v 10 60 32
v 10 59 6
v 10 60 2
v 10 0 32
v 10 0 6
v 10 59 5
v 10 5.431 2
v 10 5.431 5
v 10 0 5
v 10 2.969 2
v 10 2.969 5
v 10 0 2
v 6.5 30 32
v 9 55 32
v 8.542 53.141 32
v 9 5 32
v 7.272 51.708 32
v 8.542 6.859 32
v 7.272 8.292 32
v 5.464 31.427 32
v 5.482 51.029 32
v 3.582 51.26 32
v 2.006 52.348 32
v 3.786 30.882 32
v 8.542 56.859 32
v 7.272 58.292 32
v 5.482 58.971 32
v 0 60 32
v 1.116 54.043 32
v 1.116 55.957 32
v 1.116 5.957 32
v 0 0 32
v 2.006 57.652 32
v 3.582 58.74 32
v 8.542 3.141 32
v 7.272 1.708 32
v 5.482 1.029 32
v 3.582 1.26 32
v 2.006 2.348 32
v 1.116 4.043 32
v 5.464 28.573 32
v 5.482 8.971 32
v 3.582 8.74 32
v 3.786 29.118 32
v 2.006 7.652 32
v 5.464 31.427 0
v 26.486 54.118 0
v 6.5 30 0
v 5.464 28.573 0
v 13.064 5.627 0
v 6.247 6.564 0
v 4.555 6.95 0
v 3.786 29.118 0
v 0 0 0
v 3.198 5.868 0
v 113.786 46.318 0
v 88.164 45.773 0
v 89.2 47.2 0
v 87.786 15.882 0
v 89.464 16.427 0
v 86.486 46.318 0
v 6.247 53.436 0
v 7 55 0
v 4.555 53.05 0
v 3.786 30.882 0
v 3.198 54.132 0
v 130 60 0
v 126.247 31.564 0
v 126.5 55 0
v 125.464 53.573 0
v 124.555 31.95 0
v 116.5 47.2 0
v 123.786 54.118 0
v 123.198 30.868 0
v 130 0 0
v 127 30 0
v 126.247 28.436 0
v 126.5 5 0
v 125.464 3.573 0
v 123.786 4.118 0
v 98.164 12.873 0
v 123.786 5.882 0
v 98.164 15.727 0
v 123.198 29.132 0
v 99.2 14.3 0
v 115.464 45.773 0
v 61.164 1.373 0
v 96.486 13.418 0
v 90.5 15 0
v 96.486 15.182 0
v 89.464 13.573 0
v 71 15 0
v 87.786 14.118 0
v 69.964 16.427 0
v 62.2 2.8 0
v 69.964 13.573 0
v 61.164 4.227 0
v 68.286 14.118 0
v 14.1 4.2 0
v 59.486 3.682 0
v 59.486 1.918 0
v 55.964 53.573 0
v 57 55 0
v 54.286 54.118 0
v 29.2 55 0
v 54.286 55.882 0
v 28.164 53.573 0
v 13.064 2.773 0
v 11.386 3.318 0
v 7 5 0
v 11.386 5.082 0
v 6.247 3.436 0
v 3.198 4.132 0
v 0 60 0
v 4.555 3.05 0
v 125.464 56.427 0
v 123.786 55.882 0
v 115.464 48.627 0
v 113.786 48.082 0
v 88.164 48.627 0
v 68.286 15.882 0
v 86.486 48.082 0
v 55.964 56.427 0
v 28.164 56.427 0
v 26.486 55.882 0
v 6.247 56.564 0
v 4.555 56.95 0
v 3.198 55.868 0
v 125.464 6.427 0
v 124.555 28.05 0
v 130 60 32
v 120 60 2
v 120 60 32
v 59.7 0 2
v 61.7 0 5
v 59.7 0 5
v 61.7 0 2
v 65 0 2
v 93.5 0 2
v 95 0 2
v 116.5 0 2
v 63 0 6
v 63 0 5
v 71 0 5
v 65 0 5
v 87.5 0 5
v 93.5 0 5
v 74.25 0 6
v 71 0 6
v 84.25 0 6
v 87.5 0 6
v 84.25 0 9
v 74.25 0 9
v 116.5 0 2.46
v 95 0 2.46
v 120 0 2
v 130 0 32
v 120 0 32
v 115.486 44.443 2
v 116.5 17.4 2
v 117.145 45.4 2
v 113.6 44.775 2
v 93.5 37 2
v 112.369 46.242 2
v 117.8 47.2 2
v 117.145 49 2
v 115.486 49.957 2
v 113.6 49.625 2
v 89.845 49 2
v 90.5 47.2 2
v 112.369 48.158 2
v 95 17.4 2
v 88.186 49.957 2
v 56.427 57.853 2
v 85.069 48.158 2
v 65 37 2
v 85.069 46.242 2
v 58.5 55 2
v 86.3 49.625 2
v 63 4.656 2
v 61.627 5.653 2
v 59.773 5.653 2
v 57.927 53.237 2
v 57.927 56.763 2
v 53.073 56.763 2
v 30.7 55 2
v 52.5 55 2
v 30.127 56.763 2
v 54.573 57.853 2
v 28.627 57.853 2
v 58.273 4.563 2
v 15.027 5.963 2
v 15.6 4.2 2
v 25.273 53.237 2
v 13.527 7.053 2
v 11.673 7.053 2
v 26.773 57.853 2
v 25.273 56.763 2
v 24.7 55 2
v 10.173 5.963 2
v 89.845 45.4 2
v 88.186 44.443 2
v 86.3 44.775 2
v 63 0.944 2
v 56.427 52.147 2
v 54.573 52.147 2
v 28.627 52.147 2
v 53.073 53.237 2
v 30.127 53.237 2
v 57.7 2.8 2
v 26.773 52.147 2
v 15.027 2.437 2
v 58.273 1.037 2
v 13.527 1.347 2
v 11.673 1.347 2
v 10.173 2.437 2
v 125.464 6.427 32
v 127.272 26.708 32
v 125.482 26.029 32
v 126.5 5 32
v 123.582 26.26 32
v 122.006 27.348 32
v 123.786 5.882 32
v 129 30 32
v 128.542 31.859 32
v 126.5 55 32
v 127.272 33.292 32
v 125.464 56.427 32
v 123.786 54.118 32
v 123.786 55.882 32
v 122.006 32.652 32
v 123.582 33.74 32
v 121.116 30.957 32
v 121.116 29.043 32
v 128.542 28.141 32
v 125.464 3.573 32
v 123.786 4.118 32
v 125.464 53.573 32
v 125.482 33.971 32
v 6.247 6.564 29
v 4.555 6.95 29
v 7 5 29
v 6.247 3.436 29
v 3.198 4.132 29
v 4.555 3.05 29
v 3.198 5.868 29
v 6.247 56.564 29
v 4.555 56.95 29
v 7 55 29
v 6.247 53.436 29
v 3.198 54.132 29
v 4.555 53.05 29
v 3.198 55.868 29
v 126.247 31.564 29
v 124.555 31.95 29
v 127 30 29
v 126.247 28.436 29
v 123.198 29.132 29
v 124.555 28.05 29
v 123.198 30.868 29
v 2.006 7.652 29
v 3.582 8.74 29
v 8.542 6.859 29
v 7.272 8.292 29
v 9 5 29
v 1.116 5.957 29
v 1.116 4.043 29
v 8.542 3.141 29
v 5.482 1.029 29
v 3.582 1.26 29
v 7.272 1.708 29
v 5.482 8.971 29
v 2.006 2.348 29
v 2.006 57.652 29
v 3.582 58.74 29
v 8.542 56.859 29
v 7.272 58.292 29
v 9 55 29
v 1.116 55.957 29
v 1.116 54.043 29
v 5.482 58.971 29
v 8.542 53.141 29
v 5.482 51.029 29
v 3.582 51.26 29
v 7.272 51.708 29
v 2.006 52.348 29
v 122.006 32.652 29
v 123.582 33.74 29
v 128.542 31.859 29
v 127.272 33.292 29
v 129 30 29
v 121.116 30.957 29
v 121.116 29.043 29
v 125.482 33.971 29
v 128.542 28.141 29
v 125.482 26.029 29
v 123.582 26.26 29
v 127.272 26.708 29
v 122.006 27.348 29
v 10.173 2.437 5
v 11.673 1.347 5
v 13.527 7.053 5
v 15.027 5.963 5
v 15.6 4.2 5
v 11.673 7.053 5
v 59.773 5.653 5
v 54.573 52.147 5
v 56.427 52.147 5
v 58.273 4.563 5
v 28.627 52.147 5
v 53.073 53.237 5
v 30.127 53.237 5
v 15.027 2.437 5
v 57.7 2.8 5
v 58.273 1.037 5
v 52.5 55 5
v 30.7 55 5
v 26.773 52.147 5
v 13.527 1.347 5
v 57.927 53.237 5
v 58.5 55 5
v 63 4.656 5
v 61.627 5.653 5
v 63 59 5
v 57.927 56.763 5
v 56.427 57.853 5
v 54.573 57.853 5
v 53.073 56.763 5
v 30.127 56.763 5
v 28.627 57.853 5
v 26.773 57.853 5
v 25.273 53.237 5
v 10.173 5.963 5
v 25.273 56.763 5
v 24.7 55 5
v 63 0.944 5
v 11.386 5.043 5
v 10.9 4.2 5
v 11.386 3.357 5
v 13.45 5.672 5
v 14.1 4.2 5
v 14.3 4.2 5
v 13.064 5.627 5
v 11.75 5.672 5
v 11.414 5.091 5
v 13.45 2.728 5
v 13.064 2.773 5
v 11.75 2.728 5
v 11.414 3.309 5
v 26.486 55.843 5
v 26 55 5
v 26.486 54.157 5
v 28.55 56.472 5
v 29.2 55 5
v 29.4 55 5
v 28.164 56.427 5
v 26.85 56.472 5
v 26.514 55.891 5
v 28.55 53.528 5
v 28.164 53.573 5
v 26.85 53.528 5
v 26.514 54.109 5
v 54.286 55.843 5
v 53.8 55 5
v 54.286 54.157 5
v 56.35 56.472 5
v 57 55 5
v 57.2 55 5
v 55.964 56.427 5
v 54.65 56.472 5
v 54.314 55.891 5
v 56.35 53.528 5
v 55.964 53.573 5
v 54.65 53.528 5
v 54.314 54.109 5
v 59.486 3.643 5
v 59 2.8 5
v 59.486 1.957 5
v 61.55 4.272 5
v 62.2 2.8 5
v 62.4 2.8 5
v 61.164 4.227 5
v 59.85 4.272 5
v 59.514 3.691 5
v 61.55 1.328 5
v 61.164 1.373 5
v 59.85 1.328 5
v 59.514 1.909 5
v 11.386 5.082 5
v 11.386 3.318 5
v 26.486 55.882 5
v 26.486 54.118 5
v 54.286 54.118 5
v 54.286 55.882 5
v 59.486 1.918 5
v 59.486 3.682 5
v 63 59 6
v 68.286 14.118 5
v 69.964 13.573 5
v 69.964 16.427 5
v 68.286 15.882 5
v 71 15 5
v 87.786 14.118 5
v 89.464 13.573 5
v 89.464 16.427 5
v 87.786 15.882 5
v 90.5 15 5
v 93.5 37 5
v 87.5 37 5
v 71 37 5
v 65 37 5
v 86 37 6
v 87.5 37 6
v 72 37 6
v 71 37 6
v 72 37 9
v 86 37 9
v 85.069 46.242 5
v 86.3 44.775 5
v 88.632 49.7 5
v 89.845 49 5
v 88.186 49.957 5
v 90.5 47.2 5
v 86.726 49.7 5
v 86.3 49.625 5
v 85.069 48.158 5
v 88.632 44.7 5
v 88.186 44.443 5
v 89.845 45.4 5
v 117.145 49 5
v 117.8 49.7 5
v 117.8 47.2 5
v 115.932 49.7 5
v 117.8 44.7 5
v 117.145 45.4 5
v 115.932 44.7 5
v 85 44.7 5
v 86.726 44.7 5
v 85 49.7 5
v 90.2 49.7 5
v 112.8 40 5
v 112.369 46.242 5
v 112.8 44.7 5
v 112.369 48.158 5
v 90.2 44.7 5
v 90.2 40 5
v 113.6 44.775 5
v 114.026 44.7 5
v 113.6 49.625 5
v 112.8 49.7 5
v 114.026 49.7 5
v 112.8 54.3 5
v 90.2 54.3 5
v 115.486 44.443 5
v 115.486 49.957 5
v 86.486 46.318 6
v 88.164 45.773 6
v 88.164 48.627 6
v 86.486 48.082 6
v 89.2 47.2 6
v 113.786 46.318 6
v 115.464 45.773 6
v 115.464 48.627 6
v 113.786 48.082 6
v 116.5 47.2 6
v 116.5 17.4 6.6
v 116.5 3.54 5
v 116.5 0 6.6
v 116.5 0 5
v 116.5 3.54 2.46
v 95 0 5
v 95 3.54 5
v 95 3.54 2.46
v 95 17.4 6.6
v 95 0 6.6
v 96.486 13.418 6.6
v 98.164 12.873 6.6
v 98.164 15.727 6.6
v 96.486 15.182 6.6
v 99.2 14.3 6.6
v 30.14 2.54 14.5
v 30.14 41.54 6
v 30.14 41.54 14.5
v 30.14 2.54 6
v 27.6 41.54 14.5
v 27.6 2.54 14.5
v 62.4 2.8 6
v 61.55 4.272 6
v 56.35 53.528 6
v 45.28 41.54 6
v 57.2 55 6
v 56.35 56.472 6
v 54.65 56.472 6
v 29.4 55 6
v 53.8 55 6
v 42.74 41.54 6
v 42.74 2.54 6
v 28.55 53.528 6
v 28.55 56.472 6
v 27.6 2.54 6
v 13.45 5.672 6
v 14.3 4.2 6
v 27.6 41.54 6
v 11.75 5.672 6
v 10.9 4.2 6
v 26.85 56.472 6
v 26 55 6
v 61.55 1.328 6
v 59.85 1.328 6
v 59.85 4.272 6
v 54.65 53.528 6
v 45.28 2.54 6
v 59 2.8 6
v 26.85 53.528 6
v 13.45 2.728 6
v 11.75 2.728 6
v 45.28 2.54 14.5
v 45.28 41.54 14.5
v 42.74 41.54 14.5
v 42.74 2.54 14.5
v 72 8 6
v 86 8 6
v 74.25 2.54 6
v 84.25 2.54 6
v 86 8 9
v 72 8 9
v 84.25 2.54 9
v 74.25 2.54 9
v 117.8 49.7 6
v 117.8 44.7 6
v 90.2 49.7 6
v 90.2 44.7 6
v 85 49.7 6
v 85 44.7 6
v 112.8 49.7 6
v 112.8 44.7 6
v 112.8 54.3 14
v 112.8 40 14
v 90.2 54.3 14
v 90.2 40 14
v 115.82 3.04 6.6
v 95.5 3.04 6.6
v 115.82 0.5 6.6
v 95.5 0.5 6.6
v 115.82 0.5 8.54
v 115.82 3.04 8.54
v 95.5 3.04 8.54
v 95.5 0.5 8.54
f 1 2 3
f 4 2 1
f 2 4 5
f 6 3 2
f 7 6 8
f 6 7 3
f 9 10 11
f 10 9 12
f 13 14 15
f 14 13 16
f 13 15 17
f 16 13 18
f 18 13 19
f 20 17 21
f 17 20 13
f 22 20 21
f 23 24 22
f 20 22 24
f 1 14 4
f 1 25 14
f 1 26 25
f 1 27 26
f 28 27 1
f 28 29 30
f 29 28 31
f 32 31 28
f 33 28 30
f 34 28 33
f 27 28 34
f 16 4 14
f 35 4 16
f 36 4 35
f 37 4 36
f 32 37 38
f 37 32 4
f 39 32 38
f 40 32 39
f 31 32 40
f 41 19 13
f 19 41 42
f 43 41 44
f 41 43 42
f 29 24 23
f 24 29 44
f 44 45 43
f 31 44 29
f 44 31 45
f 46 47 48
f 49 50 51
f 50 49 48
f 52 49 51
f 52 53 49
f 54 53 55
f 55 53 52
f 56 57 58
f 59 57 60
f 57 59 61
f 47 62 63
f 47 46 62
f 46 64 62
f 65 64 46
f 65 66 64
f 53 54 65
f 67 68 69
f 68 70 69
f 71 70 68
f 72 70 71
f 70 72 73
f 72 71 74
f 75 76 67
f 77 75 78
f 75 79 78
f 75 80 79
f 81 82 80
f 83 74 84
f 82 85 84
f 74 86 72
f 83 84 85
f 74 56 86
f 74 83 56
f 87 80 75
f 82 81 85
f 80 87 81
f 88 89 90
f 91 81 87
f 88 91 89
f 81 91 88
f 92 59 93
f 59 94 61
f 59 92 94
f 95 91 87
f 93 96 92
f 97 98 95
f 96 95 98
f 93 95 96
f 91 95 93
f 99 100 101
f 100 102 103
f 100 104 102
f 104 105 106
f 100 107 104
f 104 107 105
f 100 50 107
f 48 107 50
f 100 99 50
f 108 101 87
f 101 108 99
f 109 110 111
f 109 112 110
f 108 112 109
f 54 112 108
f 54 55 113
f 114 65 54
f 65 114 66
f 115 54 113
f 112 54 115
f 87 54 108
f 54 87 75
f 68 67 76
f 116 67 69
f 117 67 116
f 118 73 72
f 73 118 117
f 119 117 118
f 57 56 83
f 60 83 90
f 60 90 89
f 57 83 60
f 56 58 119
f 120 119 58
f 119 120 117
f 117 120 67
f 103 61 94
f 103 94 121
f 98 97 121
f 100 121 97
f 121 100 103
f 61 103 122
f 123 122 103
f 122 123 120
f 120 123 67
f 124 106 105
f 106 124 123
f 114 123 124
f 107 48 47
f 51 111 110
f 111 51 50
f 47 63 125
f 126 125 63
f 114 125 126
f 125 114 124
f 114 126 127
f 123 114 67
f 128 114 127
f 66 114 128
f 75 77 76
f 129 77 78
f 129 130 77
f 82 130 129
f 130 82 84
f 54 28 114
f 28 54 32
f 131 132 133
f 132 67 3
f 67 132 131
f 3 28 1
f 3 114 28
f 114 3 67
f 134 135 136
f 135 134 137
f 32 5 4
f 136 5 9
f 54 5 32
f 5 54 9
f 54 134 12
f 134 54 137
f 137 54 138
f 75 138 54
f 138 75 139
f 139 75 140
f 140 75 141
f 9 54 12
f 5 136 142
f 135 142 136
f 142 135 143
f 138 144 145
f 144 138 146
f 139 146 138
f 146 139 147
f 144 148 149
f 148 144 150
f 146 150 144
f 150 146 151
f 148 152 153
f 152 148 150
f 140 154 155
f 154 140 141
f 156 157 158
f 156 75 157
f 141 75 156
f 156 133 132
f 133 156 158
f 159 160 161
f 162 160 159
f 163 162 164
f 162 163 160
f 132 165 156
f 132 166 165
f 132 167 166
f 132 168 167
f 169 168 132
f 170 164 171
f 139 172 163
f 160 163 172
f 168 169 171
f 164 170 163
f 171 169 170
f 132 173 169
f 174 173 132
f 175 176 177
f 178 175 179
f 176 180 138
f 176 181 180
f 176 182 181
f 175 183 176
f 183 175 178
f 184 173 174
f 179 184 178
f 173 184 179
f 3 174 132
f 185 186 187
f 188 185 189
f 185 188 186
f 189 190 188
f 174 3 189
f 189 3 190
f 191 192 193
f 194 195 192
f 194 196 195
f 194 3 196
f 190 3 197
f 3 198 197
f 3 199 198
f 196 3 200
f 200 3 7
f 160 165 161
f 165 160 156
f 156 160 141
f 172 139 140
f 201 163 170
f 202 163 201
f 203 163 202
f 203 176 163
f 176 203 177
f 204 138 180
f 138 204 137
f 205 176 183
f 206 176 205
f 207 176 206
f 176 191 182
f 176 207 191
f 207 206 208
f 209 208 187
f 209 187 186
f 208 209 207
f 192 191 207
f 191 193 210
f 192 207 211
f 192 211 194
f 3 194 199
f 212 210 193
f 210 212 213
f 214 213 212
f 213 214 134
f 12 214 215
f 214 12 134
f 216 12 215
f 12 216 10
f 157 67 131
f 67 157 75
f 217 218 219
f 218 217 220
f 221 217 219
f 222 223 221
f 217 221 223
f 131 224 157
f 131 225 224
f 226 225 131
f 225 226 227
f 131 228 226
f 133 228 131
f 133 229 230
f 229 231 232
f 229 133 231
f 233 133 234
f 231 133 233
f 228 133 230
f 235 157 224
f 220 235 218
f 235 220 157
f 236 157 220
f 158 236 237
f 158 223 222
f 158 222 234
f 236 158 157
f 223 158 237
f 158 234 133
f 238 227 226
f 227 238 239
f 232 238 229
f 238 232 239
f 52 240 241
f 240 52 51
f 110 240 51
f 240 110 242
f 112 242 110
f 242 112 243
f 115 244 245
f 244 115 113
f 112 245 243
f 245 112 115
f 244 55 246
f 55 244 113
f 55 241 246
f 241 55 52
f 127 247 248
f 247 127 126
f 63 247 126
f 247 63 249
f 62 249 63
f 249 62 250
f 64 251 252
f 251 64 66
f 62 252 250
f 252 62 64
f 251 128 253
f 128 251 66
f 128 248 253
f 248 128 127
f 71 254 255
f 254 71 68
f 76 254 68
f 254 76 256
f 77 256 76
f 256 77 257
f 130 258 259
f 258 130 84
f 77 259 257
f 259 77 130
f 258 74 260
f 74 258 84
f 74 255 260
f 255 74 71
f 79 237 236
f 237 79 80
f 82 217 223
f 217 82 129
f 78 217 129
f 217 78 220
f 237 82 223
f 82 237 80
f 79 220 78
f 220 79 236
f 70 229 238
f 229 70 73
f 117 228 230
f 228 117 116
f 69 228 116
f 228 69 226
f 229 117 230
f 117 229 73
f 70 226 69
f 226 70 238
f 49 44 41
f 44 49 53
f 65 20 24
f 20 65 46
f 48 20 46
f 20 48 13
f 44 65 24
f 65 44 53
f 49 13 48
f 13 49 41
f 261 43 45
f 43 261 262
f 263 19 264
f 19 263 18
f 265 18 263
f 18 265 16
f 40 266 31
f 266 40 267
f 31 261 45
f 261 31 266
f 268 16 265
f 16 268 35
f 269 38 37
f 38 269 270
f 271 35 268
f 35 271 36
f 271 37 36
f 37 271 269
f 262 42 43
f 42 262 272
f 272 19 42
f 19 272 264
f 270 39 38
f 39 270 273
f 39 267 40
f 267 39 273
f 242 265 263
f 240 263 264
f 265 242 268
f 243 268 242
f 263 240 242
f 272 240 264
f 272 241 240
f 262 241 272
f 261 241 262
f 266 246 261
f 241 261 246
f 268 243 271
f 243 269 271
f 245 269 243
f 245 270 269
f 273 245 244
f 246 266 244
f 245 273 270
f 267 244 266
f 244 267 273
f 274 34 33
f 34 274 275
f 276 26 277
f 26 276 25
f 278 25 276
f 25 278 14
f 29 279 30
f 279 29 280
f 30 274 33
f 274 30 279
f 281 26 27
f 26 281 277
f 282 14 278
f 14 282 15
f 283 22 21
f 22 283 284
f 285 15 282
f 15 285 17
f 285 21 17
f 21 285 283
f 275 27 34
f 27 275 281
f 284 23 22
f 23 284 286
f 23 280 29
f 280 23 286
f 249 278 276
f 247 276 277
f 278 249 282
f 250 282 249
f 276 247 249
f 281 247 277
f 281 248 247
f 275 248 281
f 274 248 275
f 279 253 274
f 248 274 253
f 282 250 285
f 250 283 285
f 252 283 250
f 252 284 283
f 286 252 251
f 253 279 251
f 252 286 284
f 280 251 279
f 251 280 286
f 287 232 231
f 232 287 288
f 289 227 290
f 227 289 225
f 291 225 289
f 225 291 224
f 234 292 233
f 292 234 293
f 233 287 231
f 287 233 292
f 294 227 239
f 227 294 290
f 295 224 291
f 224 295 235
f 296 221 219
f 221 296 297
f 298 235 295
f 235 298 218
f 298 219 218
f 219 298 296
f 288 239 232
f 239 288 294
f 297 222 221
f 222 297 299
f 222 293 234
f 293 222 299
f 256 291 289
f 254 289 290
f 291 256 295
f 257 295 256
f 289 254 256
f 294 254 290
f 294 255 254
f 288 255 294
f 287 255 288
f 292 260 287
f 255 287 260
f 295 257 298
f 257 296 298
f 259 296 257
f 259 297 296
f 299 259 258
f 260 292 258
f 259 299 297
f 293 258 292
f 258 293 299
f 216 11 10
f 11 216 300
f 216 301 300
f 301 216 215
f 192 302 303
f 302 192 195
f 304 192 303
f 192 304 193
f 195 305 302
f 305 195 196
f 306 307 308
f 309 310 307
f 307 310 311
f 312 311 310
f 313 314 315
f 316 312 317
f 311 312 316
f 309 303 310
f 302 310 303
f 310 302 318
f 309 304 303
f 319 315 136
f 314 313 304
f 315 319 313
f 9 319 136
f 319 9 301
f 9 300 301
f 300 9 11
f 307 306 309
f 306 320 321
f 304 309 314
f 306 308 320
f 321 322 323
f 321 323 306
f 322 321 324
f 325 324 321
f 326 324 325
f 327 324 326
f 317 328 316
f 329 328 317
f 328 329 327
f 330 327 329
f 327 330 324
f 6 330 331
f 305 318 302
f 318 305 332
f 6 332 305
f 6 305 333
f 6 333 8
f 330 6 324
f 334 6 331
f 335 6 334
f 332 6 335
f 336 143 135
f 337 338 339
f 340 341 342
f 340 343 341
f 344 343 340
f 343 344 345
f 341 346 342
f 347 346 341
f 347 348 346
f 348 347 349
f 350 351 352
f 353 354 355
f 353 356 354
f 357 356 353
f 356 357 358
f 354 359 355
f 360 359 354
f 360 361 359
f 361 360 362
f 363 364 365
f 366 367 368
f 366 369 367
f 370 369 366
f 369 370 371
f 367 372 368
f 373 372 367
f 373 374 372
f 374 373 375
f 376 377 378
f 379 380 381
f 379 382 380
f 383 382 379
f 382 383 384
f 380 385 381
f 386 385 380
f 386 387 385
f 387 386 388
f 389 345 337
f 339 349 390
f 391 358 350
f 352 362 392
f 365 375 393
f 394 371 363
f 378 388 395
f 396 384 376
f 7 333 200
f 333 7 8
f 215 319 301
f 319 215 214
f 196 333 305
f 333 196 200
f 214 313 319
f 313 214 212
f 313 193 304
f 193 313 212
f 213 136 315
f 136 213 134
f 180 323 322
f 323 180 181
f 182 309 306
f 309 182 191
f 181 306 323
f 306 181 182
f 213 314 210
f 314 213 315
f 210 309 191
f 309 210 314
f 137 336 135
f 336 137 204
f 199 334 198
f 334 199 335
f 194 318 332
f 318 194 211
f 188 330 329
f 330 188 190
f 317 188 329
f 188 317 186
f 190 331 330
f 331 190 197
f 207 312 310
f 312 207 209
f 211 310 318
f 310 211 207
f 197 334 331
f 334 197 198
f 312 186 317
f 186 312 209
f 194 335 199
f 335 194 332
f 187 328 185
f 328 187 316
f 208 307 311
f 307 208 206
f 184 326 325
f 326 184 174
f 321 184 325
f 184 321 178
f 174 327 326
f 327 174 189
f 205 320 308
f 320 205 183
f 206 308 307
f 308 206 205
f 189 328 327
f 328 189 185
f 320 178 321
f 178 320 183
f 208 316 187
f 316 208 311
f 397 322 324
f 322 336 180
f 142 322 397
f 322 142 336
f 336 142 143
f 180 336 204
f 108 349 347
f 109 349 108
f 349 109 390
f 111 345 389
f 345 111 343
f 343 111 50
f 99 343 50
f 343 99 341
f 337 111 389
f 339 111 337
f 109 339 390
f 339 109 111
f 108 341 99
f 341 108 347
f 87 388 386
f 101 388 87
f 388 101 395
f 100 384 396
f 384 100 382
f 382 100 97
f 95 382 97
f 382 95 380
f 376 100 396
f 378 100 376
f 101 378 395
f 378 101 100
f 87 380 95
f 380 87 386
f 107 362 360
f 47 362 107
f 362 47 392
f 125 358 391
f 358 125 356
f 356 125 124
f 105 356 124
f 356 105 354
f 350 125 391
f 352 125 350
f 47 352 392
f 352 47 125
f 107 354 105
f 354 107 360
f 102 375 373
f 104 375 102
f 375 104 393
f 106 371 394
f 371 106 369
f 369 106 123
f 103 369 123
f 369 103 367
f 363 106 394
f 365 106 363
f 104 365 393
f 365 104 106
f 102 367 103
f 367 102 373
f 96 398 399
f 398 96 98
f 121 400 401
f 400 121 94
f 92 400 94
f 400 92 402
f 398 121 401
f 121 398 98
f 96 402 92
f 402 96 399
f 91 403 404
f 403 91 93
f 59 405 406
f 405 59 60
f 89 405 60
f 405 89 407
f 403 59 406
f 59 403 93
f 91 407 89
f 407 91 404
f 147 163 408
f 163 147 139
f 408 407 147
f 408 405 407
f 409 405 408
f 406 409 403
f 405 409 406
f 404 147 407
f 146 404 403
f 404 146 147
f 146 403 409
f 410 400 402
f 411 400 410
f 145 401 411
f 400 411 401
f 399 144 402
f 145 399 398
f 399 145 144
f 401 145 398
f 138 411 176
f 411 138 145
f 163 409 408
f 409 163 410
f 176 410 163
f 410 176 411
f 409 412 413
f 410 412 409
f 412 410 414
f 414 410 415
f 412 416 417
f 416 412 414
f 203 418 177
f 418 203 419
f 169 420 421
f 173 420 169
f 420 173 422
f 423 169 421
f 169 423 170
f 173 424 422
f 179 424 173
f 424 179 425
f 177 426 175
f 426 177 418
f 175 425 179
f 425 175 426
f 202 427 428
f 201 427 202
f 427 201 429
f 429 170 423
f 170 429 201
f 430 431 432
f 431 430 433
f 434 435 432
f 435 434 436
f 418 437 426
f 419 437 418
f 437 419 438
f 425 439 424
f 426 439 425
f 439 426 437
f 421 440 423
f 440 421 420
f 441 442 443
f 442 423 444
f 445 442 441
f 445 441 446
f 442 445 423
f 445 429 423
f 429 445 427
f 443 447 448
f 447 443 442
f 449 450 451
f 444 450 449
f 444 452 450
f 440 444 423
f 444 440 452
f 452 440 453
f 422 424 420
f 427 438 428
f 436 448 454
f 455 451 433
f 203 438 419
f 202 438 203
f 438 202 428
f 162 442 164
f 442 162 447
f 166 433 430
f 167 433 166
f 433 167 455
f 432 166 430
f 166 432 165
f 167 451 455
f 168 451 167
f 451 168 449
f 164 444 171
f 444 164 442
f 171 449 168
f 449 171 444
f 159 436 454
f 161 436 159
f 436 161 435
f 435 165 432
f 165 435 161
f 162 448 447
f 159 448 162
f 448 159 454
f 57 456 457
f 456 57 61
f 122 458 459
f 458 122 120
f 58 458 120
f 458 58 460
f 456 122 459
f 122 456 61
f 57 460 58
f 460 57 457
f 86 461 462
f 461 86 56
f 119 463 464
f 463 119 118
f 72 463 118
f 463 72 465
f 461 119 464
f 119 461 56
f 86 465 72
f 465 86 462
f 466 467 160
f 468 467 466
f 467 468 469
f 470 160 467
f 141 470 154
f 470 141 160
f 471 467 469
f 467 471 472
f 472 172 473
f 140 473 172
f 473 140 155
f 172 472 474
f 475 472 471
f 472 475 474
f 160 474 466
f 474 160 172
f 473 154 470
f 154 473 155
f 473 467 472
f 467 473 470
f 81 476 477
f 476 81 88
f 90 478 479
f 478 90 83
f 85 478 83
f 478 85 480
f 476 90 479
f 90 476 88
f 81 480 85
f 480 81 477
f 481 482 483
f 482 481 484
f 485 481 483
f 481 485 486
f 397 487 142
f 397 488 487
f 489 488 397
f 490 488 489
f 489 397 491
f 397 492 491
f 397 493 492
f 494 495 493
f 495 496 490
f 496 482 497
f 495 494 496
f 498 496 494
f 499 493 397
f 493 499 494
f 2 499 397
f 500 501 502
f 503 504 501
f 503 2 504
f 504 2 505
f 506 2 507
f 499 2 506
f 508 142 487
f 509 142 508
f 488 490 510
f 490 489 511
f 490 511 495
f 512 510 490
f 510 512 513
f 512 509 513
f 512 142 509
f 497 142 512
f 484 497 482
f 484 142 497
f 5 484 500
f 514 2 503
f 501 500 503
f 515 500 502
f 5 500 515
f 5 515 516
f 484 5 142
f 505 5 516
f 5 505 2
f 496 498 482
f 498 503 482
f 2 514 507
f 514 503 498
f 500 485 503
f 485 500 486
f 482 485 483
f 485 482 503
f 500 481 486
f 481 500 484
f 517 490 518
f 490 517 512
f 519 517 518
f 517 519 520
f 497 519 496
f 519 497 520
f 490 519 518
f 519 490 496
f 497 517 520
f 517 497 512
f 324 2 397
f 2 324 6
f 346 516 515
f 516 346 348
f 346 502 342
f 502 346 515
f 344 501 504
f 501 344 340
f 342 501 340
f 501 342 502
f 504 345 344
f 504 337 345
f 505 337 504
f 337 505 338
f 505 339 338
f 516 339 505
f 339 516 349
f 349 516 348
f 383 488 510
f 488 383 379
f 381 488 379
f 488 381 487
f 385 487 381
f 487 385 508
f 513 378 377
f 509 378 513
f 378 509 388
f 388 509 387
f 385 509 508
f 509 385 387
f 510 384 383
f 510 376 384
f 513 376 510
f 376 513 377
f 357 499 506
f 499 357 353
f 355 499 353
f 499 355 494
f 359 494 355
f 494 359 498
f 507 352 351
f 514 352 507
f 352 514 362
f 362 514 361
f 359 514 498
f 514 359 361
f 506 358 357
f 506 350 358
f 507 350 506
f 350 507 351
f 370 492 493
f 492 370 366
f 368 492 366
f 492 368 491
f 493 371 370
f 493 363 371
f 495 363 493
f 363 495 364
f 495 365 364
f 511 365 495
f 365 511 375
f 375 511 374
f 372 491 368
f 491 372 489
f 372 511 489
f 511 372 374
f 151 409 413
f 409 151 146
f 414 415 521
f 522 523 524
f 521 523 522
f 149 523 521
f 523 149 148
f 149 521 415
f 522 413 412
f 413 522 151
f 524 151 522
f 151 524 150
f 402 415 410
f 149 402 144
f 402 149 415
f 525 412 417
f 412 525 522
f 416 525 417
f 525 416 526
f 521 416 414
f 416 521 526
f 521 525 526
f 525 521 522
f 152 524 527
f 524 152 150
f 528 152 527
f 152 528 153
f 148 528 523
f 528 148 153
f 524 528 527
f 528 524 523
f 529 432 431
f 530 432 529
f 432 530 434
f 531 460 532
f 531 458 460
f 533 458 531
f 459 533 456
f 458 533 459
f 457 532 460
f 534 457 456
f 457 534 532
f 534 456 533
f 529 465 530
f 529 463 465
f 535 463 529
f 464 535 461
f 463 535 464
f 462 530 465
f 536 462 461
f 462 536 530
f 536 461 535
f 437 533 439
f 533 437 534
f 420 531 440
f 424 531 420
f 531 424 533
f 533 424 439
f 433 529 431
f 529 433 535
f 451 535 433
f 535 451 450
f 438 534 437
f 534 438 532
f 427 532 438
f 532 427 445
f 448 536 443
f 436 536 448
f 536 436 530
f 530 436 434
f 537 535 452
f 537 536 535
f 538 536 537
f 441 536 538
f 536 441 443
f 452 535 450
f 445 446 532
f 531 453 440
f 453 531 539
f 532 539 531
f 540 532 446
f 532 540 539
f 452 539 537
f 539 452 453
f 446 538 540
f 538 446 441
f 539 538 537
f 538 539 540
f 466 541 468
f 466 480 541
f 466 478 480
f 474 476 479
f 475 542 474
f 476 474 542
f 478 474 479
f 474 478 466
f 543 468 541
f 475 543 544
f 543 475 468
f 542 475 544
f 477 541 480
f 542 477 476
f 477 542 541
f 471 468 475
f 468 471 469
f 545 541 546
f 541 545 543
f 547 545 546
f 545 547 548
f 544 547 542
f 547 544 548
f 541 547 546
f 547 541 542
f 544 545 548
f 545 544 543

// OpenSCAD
// file: gy-89.scad
module gy89Body(){
    //pcb max dimensions, not the contour
    color([0,0,0.5])
        cube([21.5, 17.4, 1.6]);
    //socket headers for ardiuno
    color([0,0,0]){
        translate([0.5, 0.5,1]){
            cube([2.54*8, 2.54, 2.54]);
        }
    }
}

module gy89HolePattern(r,h){
    rr = 3/2;
    translate([1.2+rr, 12.8+rr, 0]){
        cylinder(h, r, r);
    }
    
}

module gy89Module(){
    difference(){
        gy89Body();
        translate([0, 0, -1])
            gy89HolePattern(3/2, 3);
    }
}

module gy89Fixture(r, th){
    difference(){
            translate([0, 0, -th])
                cube([21.5, 17.4, th]);
            translate([-1, -1, -2.54])
                cube([21.5+2, 2.54+2, 2.54+1]);
            translate([0, 0, 0-th-1])
                gy89HolePattern(r, th+2);
        
        
        }
}

//gy89Body();
gy89Module();
gy89Fixture(3/2, 5);
// file: dsn-dvm-368.scad
module dsnDvm368Body(){
    color([0, 0.5, 0]){
        translate([0, 4.7,0])
            cube([32.8, 5, 1]);
        
        translate([5.2,0,0])
            cube([22.6, 14.3, 1]);
        
    }
    
    color([1, 1, 1])
        translate([5.2,0,1])
            cube([22.6, 14.3, 7]);
    
    color([0.2, 0.2, 0.2])
        translate([5.2,0,8])
            cube([22.6, 14.3, 1]);
}

module dsnDvm368HolePattern(r,h){
    translate([2.7,1.0+4.7+1.5, 0])
        cylinder(h, r, r);
    translate([1.5+28.5,1.0+4.7+1.5, 0])
        cylinder(h, r, r);
}

module dsnDvm368Module(){
    difference(){
        dsnDvm368Body();
        translate([0,0,-1])
            dsnDvm368HolePattern(1.5,3);
    }
}

module dsnDvm368Fixture(r, th){
    difference(){
        translate([0,0,-3]){
            dsnDvm368HolePattern(2.8,3);
            translate([0,0,3-th])
            cube([32.8, 14.3, th-3]);
        }
        translate([0,0,0-th-1])
            dsnDvm368HolePattern(r,th+2);
                
    }
}

//dsnDvm368Body();
//dsnDvm368HolePattern(1.5,10);
//dsnDvm368Module();
//dsnDvm368Fixture(3/2, 5);
// file: jy-mcy-bt-board-v105.scad
module jyMcuBtBoardV105Body(){
    translate([6,0,0]){
        //pcb max dimensions, not the contour
        color([0,0,0.5])
            cube([16.5, 37, 1]);
        //socket headers for ardiuno
        color([0,0.5,0]){
            translate([1, 8,1]){
                cube([14, 29, 3]);
            }
        }
        
        color([0,0,0]){
            translate([3.25, 0,1]){
                cube([10, 2.54, 3]);
            }
        }
    }
}

module jyMcuBtBoardV105HolePattern(r,h){
    translate([6-r,15, 0])
        cylinder(h, r, r);
    translate([6+16.5+r,15, 0])
        cylinder(h, r, r);
}

module jyMcuBtBoardV105Module(){
    jyMcuBtBoardV105Body();
}

module jyMcuBtBoardV105Fixture(r, th){
    difference(){
        translate([0,0,-th]){
            cube([16.5+12, 37, th]);
        }
        translate([0,0,0-th-1])
                jyMcuBtBoardV105HolePattern(1.5,th+2);
    }
}
//jyMcuBtBoardV105Body();
//jyMcuBtBoardV105HolePattern(1.5,10);
//jyMcuBtBoardV105Module();
//jyMcuBtBoardV105Fixture(3/2, 5);
// file: dk-nano-003.scad
module dkNano003Body(){
    //pcb max dimensions, not the contour
    color([0,0,0.5])
        cube([53, 59, 1]);
    //socket headers for ardiuno
    color([0,0,0]){
        translate([17.6, 2.54,1]){
            cube([2.54, 39, 8.5]);
            translate([2.54+12.6, 0, 0])
                cube([2.54, 39, 8.5]);
        }
    }
}

module dkNano003HolePattern(r,h){
    rr = 3.4/2;
    translate([0.9+rr, 2.5+rr, 0]){
        cylinder(h, r, r);
    }
    
    translate([49+rr, 1.1+rr, 0]){
        cylinder(h, r, r);
    }
    
    translate([16+rr, 53.3+rr, 0]){
        cylinder(h, r, r);
    }
    
    translate([43.8+rr, 53.3+rr, 0]){
        cylinder(h, r, r);
    }
}

module dkNano003Module(){
    difference(){
        dkNano003Body();
        translate([0, 0, -1])
            dkNano003HolePattern(3.4/2, 3);
    }
}

module dkNano003Fixture(r, th){
    difference(){
        intersection(){
            translate([0,0,-3]){
                dkNano003HolePattern(6/2, 3);
                translate([0,0,3-th])
                    cube([53, 59, th-3]);
            }
            translate([0, 0, 0-3-th])
                cube([53, 59, th+3+0.5]);
        }
        
        translate([0, 0, 0-3-th-1])
            dkNano003HolePattern(r, 3+th+2);
        }
}
dkNano003Module();
dkNano003Fixture(3/2, 5);
// file: shelf.scad
module shelfBody(sx, sy, sz,th){
    cube([10, sy, sz+th]);
    translate([10, 0,0])
        cube([sx, sy, th]);
    translate([sx+10, 0,0])
        cube([10, sy, sz+th]);
}

module shelfHeadHolePattern(sx, sy, sz,r,h){
    translate([5, 5,0])
        cylinder(h, r, r);
    translate([5, sy-5,0])
        cylinder(h, r, r);
    //translate([5, sy/2,0])
    //    cylinder(h, r, r);
    translate([sx+20-5, sy/2,0])
        cylinder(h, r, r);
}

module shelfThreadHolePattern(sx, sy, sz,r,h){
    translate([sx+20-5, 5,0])
        cylinder(h, r, r);
    translate([sx+20-5, sy-5,0])
        cylinder(h, r, r);
    //translate([5, sy/2,0])
    //    cylinder(h, r, r);
    translate([5, sy/2,0])
        cylinder(h, r, r);
}

module shelfModuleEven(sx, sy, sz, th, r){
    headDepth = 3;
    difference(){
        shelfBody(sx, sy, sz, th);
        translate([0,0,-1]){
            shelfHeadHolePattern(sx, sy, sz, r+0.5, th+sz+2);
            shelfThreadHolePattern(sx, sy, sz, r, th+sz+2);
        }
        translate([0, 0, sz+th-headDepth])
            shelfHeadHolePattern(sx, sy, sz, 4, headDepth+1);
        
    }
}

module shelfModuleOdd(sx, sy, sz, ,th, r){
    translate([sx+20, 0, 0])
        mirror([1,0,0])
            shelfModuleEven(sx, sy, sz, th, r);
    
}

shelfModuleEven(80, 40, 15, 4, 3/2);

translate([0,0,50]){
    shelfModuleOdd(80, 40, 15, 4, 3/2);
}
// main file
use <shelf.scad>
use <dk-nano-003.scad>
use <jy-mcy-bt-board-v105.scad>
use <dsn-dvm-368.scad>
use <gy-89.scad>

dkNanoPos=[10, 0, 5];
btPos=[65, 0, 5];
dispPos = btPos+[20,40,0];
sensPos = btPos+[30,0,0];

module rotorFixtureBody(){
    shelfModuleEven(110, 60, 30, 2, 3/2);
    translate(dkNanoPos)
        dkNano003Fixture(3/2, 5);
    translate(btPos)
        jyMcuBtBoardV105Fixture(3/2, 5);
    translate(dispPos)
        dsnDvm368Fixture(3/2, 5);
    translate(sensPos)
        gy89Fixture(3/2, 5);
}

module rotorFixtureModules(){
    translate(dkNanoPos)
        dkNano003Module(3/2, 5);
    translate(btPos)
        jyMcuBtBoardV105Module(3/2, 5);
    translate(dispPos)
        dsnDvm368Module(3/2, 5);
    translate(sensPos)
        gy89Module(3/2, 5);
}

module rotorFixtureHolePattern(h){
    translate(dkNanoPos)
        dkNano003HolePattern(3/2, h);
    translate(btPos)
        jyMcuBtBoardV105HolePattern(3/2, h);
    translate(dispPos)
        dsnDvm368HolePattern(3/2, h);
    translate(sensPos)
        gy89HolePattern(3/2, h);
}

module rotorFixtureModule(){
    difference(){
        rotorFixtureBody();
        translate([0,0,-20])
            rotorFixtureHolePattern(60);
    }
}
rotorFixtureModule();
rotorFixtureModules();
